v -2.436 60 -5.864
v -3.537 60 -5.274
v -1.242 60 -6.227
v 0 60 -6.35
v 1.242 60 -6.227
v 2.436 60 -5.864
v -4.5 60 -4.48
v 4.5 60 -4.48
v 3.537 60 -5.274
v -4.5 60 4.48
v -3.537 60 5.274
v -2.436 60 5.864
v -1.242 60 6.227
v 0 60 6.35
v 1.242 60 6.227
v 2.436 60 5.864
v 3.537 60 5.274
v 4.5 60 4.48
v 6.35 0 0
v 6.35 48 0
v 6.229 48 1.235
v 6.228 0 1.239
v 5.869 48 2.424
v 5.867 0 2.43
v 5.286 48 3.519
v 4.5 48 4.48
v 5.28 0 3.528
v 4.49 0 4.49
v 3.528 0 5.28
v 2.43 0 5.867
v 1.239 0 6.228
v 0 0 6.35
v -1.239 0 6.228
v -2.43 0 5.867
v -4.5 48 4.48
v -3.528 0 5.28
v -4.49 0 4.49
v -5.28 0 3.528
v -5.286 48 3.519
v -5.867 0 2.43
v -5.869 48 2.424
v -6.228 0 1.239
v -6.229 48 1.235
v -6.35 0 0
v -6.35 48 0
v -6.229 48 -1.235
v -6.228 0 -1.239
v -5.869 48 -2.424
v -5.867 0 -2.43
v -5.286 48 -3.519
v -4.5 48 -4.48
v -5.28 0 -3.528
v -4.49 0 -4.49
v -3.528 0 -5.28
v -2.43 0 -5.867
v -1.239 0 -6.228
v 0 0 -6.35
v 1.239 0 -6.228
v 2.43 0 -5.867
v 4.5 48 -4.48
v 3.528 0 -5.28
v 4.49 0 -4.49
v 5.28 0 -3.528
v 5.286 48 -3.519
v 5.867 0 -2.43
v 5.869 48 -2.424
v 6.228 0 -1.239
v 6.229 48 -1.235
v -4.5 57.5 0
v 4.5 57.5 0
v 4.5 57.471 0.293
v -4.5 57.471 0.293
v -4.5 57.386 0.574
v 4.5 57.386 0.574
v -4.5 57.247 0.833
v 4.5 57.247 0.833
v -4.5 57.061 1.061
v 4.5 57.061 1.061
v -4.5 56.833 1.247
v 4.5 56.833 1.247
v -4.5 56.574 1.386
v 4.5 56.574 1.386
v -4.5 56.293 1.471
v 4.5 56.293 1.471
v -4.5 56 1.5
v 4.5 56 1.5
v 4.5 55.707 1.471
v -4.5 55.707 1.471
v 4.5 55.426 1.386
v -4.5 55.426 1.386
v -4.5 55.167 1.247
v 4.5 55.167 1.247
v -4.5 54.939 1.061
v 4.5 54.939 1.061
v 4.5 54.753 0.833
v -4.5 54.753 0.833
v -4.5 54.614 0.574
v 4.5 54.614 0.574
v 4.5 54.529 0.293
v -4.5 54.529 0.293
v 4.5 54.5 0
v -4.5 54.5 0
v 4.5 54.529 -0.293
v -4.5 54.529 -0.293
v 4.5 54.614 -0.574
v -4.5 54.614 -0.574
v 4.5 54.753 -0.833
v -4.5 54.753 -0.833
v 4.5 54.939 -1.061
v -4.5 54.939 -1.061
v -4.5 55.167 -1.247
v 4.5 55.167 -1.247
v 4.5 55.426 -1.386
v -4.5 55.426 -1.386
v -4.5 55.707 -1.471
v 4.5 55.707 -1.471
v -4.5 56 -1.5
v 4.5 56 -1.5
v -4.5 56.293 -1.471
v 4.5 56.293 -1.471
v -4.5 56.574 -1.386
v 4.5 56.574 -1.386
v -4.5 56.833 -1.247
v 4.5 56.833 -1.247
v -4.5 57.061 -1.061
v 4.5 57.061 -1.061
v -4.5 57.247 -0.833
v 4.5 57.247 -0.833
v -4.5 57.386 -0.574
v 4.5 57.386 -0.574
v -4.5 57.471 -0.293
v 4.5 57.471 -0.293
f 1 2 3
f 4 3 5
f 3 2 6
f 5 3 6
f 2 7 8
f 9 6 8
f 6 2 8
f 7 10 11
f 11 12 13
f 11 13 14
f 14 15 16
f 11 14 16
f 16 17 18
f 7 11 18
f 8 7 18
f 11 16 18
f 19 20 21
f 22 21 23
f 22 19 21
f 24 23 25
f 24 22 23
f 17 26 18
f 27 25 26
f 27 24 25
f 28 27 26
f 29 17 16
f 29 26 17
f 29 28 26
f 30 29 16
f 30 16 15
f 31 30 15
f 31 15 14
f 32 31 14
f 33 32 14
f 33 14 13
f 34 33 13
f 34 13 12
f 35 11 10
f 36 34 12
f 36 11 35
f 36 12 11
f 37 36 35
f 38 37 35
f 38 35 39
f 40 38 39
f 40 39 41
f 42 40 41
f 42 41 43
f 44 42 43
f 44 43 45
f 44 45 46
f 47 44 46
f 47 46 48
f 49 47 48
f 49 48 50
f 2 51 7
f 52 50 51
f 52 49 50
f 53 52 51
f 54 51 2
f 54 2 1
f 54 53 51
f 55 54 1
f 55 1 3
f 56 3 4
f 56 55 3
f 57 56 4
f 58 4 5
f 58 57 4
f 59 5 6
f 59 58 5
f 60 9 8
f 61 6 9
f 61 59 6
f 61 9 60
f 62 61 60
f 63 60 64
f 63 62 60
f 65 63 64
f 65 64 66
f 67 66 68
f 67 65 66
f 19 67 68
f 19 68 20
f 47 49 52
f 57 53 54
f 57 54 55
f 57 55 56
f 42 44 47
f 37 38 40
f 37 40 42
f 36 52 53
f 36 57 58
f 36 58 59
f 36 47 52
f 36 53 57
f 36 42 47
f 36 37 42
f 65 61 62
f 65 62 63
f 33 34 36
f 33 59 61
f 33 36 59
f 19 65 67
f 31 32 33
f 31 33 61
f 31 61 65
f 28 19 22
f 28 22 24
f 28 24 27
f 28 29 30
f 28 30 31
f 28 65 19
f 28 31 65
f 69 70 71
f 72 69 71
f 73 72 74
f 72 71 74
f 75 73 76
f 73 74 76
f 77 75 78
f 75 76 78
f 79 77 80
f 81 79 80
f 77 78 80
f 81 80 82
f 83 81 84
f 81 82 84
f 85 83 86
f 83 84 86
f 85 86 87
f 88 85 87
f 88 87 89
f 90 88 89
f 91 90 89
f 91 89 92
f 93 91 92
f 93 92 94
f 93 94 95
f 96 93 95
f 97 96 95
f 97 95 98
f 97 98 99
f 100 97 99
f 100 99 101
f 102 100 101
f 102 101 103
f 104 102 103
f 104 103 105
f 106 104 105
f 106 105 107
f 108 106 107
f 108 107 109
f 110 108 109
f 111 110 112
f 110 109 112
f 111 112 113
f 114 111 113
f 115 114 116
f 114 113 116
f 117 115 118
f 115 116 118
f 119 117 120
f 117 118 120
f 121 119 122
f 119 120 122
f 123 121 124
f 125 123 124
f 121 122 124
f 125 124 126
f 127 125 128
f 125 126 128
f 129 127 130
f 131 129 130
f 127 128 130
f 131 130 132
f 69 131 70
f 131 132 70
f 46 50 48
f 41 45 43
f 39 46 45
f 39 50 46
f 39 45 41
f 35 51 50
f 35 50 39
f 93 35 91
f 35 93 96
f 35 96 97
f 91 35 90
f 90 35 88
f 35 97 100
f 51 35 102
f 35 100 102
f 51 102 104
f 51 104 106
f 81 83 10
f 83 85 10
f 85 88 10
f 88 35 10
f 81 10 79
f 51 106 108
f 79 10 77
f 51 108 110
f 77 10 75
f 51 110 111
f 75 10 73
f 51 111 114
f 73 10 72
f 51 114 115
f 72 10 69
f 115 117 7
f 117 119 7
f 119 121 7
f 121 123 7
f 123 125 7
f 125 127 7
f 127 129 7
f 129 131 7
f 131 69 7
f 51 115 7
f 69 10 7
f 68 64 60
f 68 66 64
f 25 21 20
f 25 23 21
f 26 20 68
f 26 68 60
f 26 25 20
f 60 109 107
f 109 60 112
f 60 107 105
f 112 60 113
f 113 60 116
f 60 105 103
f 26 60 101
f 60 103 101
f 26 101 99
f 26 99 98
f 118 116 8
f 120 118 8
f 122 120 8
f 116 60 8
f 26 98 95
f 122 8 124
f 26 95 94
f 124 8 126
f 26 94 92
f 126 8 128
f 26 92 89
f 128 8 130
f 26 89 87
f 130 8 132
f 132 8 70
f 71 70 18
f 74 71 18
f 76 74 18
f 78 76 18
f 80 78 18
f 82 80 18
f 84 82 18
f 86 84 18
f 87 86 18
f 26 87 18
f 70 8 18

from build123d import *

# Parameters (mm, degrees)
F0_R     = 6.35
F1_DEPTH = 60
F3_DEPTH = 12
F4_R     = 1.5
F5_DEPTH = 25


with BuildPart() as f1:
    # F0 (on Front) → F1 (new body)
    with BuildSketch(Plane.XZ):
        Circle(F0_R)
    extrude(amount=-F1_DEPTH)

    # F2 (on face) → F3 (cut)
    with BuildSketch(Plane(origin=(0, 60, 0), x_dir=(-1, 0, 0), z_dir=(0, 1, 0))):
        Polygon((-6.955139, 0), (-4.5, -7.185974), (-4.5, 7.369376), align=None)
        Polygon((4.5, 7.369376), (4.5, -7.185974), (6.955139, 0), align=None)
    extrude(amount=-F3_DEPTH, mode=Mode.SUBTRACT)

    # F4 (on face) → F5 (cut)
    with BuildSketch(Plane.YZ.offset(4.5)):
        with Locations((56, 0)):
            Circle(F4_R)
    extrude(amount=-F5_DEPTH, mode=Mode.SUBTRACT)


solid = f1.part
